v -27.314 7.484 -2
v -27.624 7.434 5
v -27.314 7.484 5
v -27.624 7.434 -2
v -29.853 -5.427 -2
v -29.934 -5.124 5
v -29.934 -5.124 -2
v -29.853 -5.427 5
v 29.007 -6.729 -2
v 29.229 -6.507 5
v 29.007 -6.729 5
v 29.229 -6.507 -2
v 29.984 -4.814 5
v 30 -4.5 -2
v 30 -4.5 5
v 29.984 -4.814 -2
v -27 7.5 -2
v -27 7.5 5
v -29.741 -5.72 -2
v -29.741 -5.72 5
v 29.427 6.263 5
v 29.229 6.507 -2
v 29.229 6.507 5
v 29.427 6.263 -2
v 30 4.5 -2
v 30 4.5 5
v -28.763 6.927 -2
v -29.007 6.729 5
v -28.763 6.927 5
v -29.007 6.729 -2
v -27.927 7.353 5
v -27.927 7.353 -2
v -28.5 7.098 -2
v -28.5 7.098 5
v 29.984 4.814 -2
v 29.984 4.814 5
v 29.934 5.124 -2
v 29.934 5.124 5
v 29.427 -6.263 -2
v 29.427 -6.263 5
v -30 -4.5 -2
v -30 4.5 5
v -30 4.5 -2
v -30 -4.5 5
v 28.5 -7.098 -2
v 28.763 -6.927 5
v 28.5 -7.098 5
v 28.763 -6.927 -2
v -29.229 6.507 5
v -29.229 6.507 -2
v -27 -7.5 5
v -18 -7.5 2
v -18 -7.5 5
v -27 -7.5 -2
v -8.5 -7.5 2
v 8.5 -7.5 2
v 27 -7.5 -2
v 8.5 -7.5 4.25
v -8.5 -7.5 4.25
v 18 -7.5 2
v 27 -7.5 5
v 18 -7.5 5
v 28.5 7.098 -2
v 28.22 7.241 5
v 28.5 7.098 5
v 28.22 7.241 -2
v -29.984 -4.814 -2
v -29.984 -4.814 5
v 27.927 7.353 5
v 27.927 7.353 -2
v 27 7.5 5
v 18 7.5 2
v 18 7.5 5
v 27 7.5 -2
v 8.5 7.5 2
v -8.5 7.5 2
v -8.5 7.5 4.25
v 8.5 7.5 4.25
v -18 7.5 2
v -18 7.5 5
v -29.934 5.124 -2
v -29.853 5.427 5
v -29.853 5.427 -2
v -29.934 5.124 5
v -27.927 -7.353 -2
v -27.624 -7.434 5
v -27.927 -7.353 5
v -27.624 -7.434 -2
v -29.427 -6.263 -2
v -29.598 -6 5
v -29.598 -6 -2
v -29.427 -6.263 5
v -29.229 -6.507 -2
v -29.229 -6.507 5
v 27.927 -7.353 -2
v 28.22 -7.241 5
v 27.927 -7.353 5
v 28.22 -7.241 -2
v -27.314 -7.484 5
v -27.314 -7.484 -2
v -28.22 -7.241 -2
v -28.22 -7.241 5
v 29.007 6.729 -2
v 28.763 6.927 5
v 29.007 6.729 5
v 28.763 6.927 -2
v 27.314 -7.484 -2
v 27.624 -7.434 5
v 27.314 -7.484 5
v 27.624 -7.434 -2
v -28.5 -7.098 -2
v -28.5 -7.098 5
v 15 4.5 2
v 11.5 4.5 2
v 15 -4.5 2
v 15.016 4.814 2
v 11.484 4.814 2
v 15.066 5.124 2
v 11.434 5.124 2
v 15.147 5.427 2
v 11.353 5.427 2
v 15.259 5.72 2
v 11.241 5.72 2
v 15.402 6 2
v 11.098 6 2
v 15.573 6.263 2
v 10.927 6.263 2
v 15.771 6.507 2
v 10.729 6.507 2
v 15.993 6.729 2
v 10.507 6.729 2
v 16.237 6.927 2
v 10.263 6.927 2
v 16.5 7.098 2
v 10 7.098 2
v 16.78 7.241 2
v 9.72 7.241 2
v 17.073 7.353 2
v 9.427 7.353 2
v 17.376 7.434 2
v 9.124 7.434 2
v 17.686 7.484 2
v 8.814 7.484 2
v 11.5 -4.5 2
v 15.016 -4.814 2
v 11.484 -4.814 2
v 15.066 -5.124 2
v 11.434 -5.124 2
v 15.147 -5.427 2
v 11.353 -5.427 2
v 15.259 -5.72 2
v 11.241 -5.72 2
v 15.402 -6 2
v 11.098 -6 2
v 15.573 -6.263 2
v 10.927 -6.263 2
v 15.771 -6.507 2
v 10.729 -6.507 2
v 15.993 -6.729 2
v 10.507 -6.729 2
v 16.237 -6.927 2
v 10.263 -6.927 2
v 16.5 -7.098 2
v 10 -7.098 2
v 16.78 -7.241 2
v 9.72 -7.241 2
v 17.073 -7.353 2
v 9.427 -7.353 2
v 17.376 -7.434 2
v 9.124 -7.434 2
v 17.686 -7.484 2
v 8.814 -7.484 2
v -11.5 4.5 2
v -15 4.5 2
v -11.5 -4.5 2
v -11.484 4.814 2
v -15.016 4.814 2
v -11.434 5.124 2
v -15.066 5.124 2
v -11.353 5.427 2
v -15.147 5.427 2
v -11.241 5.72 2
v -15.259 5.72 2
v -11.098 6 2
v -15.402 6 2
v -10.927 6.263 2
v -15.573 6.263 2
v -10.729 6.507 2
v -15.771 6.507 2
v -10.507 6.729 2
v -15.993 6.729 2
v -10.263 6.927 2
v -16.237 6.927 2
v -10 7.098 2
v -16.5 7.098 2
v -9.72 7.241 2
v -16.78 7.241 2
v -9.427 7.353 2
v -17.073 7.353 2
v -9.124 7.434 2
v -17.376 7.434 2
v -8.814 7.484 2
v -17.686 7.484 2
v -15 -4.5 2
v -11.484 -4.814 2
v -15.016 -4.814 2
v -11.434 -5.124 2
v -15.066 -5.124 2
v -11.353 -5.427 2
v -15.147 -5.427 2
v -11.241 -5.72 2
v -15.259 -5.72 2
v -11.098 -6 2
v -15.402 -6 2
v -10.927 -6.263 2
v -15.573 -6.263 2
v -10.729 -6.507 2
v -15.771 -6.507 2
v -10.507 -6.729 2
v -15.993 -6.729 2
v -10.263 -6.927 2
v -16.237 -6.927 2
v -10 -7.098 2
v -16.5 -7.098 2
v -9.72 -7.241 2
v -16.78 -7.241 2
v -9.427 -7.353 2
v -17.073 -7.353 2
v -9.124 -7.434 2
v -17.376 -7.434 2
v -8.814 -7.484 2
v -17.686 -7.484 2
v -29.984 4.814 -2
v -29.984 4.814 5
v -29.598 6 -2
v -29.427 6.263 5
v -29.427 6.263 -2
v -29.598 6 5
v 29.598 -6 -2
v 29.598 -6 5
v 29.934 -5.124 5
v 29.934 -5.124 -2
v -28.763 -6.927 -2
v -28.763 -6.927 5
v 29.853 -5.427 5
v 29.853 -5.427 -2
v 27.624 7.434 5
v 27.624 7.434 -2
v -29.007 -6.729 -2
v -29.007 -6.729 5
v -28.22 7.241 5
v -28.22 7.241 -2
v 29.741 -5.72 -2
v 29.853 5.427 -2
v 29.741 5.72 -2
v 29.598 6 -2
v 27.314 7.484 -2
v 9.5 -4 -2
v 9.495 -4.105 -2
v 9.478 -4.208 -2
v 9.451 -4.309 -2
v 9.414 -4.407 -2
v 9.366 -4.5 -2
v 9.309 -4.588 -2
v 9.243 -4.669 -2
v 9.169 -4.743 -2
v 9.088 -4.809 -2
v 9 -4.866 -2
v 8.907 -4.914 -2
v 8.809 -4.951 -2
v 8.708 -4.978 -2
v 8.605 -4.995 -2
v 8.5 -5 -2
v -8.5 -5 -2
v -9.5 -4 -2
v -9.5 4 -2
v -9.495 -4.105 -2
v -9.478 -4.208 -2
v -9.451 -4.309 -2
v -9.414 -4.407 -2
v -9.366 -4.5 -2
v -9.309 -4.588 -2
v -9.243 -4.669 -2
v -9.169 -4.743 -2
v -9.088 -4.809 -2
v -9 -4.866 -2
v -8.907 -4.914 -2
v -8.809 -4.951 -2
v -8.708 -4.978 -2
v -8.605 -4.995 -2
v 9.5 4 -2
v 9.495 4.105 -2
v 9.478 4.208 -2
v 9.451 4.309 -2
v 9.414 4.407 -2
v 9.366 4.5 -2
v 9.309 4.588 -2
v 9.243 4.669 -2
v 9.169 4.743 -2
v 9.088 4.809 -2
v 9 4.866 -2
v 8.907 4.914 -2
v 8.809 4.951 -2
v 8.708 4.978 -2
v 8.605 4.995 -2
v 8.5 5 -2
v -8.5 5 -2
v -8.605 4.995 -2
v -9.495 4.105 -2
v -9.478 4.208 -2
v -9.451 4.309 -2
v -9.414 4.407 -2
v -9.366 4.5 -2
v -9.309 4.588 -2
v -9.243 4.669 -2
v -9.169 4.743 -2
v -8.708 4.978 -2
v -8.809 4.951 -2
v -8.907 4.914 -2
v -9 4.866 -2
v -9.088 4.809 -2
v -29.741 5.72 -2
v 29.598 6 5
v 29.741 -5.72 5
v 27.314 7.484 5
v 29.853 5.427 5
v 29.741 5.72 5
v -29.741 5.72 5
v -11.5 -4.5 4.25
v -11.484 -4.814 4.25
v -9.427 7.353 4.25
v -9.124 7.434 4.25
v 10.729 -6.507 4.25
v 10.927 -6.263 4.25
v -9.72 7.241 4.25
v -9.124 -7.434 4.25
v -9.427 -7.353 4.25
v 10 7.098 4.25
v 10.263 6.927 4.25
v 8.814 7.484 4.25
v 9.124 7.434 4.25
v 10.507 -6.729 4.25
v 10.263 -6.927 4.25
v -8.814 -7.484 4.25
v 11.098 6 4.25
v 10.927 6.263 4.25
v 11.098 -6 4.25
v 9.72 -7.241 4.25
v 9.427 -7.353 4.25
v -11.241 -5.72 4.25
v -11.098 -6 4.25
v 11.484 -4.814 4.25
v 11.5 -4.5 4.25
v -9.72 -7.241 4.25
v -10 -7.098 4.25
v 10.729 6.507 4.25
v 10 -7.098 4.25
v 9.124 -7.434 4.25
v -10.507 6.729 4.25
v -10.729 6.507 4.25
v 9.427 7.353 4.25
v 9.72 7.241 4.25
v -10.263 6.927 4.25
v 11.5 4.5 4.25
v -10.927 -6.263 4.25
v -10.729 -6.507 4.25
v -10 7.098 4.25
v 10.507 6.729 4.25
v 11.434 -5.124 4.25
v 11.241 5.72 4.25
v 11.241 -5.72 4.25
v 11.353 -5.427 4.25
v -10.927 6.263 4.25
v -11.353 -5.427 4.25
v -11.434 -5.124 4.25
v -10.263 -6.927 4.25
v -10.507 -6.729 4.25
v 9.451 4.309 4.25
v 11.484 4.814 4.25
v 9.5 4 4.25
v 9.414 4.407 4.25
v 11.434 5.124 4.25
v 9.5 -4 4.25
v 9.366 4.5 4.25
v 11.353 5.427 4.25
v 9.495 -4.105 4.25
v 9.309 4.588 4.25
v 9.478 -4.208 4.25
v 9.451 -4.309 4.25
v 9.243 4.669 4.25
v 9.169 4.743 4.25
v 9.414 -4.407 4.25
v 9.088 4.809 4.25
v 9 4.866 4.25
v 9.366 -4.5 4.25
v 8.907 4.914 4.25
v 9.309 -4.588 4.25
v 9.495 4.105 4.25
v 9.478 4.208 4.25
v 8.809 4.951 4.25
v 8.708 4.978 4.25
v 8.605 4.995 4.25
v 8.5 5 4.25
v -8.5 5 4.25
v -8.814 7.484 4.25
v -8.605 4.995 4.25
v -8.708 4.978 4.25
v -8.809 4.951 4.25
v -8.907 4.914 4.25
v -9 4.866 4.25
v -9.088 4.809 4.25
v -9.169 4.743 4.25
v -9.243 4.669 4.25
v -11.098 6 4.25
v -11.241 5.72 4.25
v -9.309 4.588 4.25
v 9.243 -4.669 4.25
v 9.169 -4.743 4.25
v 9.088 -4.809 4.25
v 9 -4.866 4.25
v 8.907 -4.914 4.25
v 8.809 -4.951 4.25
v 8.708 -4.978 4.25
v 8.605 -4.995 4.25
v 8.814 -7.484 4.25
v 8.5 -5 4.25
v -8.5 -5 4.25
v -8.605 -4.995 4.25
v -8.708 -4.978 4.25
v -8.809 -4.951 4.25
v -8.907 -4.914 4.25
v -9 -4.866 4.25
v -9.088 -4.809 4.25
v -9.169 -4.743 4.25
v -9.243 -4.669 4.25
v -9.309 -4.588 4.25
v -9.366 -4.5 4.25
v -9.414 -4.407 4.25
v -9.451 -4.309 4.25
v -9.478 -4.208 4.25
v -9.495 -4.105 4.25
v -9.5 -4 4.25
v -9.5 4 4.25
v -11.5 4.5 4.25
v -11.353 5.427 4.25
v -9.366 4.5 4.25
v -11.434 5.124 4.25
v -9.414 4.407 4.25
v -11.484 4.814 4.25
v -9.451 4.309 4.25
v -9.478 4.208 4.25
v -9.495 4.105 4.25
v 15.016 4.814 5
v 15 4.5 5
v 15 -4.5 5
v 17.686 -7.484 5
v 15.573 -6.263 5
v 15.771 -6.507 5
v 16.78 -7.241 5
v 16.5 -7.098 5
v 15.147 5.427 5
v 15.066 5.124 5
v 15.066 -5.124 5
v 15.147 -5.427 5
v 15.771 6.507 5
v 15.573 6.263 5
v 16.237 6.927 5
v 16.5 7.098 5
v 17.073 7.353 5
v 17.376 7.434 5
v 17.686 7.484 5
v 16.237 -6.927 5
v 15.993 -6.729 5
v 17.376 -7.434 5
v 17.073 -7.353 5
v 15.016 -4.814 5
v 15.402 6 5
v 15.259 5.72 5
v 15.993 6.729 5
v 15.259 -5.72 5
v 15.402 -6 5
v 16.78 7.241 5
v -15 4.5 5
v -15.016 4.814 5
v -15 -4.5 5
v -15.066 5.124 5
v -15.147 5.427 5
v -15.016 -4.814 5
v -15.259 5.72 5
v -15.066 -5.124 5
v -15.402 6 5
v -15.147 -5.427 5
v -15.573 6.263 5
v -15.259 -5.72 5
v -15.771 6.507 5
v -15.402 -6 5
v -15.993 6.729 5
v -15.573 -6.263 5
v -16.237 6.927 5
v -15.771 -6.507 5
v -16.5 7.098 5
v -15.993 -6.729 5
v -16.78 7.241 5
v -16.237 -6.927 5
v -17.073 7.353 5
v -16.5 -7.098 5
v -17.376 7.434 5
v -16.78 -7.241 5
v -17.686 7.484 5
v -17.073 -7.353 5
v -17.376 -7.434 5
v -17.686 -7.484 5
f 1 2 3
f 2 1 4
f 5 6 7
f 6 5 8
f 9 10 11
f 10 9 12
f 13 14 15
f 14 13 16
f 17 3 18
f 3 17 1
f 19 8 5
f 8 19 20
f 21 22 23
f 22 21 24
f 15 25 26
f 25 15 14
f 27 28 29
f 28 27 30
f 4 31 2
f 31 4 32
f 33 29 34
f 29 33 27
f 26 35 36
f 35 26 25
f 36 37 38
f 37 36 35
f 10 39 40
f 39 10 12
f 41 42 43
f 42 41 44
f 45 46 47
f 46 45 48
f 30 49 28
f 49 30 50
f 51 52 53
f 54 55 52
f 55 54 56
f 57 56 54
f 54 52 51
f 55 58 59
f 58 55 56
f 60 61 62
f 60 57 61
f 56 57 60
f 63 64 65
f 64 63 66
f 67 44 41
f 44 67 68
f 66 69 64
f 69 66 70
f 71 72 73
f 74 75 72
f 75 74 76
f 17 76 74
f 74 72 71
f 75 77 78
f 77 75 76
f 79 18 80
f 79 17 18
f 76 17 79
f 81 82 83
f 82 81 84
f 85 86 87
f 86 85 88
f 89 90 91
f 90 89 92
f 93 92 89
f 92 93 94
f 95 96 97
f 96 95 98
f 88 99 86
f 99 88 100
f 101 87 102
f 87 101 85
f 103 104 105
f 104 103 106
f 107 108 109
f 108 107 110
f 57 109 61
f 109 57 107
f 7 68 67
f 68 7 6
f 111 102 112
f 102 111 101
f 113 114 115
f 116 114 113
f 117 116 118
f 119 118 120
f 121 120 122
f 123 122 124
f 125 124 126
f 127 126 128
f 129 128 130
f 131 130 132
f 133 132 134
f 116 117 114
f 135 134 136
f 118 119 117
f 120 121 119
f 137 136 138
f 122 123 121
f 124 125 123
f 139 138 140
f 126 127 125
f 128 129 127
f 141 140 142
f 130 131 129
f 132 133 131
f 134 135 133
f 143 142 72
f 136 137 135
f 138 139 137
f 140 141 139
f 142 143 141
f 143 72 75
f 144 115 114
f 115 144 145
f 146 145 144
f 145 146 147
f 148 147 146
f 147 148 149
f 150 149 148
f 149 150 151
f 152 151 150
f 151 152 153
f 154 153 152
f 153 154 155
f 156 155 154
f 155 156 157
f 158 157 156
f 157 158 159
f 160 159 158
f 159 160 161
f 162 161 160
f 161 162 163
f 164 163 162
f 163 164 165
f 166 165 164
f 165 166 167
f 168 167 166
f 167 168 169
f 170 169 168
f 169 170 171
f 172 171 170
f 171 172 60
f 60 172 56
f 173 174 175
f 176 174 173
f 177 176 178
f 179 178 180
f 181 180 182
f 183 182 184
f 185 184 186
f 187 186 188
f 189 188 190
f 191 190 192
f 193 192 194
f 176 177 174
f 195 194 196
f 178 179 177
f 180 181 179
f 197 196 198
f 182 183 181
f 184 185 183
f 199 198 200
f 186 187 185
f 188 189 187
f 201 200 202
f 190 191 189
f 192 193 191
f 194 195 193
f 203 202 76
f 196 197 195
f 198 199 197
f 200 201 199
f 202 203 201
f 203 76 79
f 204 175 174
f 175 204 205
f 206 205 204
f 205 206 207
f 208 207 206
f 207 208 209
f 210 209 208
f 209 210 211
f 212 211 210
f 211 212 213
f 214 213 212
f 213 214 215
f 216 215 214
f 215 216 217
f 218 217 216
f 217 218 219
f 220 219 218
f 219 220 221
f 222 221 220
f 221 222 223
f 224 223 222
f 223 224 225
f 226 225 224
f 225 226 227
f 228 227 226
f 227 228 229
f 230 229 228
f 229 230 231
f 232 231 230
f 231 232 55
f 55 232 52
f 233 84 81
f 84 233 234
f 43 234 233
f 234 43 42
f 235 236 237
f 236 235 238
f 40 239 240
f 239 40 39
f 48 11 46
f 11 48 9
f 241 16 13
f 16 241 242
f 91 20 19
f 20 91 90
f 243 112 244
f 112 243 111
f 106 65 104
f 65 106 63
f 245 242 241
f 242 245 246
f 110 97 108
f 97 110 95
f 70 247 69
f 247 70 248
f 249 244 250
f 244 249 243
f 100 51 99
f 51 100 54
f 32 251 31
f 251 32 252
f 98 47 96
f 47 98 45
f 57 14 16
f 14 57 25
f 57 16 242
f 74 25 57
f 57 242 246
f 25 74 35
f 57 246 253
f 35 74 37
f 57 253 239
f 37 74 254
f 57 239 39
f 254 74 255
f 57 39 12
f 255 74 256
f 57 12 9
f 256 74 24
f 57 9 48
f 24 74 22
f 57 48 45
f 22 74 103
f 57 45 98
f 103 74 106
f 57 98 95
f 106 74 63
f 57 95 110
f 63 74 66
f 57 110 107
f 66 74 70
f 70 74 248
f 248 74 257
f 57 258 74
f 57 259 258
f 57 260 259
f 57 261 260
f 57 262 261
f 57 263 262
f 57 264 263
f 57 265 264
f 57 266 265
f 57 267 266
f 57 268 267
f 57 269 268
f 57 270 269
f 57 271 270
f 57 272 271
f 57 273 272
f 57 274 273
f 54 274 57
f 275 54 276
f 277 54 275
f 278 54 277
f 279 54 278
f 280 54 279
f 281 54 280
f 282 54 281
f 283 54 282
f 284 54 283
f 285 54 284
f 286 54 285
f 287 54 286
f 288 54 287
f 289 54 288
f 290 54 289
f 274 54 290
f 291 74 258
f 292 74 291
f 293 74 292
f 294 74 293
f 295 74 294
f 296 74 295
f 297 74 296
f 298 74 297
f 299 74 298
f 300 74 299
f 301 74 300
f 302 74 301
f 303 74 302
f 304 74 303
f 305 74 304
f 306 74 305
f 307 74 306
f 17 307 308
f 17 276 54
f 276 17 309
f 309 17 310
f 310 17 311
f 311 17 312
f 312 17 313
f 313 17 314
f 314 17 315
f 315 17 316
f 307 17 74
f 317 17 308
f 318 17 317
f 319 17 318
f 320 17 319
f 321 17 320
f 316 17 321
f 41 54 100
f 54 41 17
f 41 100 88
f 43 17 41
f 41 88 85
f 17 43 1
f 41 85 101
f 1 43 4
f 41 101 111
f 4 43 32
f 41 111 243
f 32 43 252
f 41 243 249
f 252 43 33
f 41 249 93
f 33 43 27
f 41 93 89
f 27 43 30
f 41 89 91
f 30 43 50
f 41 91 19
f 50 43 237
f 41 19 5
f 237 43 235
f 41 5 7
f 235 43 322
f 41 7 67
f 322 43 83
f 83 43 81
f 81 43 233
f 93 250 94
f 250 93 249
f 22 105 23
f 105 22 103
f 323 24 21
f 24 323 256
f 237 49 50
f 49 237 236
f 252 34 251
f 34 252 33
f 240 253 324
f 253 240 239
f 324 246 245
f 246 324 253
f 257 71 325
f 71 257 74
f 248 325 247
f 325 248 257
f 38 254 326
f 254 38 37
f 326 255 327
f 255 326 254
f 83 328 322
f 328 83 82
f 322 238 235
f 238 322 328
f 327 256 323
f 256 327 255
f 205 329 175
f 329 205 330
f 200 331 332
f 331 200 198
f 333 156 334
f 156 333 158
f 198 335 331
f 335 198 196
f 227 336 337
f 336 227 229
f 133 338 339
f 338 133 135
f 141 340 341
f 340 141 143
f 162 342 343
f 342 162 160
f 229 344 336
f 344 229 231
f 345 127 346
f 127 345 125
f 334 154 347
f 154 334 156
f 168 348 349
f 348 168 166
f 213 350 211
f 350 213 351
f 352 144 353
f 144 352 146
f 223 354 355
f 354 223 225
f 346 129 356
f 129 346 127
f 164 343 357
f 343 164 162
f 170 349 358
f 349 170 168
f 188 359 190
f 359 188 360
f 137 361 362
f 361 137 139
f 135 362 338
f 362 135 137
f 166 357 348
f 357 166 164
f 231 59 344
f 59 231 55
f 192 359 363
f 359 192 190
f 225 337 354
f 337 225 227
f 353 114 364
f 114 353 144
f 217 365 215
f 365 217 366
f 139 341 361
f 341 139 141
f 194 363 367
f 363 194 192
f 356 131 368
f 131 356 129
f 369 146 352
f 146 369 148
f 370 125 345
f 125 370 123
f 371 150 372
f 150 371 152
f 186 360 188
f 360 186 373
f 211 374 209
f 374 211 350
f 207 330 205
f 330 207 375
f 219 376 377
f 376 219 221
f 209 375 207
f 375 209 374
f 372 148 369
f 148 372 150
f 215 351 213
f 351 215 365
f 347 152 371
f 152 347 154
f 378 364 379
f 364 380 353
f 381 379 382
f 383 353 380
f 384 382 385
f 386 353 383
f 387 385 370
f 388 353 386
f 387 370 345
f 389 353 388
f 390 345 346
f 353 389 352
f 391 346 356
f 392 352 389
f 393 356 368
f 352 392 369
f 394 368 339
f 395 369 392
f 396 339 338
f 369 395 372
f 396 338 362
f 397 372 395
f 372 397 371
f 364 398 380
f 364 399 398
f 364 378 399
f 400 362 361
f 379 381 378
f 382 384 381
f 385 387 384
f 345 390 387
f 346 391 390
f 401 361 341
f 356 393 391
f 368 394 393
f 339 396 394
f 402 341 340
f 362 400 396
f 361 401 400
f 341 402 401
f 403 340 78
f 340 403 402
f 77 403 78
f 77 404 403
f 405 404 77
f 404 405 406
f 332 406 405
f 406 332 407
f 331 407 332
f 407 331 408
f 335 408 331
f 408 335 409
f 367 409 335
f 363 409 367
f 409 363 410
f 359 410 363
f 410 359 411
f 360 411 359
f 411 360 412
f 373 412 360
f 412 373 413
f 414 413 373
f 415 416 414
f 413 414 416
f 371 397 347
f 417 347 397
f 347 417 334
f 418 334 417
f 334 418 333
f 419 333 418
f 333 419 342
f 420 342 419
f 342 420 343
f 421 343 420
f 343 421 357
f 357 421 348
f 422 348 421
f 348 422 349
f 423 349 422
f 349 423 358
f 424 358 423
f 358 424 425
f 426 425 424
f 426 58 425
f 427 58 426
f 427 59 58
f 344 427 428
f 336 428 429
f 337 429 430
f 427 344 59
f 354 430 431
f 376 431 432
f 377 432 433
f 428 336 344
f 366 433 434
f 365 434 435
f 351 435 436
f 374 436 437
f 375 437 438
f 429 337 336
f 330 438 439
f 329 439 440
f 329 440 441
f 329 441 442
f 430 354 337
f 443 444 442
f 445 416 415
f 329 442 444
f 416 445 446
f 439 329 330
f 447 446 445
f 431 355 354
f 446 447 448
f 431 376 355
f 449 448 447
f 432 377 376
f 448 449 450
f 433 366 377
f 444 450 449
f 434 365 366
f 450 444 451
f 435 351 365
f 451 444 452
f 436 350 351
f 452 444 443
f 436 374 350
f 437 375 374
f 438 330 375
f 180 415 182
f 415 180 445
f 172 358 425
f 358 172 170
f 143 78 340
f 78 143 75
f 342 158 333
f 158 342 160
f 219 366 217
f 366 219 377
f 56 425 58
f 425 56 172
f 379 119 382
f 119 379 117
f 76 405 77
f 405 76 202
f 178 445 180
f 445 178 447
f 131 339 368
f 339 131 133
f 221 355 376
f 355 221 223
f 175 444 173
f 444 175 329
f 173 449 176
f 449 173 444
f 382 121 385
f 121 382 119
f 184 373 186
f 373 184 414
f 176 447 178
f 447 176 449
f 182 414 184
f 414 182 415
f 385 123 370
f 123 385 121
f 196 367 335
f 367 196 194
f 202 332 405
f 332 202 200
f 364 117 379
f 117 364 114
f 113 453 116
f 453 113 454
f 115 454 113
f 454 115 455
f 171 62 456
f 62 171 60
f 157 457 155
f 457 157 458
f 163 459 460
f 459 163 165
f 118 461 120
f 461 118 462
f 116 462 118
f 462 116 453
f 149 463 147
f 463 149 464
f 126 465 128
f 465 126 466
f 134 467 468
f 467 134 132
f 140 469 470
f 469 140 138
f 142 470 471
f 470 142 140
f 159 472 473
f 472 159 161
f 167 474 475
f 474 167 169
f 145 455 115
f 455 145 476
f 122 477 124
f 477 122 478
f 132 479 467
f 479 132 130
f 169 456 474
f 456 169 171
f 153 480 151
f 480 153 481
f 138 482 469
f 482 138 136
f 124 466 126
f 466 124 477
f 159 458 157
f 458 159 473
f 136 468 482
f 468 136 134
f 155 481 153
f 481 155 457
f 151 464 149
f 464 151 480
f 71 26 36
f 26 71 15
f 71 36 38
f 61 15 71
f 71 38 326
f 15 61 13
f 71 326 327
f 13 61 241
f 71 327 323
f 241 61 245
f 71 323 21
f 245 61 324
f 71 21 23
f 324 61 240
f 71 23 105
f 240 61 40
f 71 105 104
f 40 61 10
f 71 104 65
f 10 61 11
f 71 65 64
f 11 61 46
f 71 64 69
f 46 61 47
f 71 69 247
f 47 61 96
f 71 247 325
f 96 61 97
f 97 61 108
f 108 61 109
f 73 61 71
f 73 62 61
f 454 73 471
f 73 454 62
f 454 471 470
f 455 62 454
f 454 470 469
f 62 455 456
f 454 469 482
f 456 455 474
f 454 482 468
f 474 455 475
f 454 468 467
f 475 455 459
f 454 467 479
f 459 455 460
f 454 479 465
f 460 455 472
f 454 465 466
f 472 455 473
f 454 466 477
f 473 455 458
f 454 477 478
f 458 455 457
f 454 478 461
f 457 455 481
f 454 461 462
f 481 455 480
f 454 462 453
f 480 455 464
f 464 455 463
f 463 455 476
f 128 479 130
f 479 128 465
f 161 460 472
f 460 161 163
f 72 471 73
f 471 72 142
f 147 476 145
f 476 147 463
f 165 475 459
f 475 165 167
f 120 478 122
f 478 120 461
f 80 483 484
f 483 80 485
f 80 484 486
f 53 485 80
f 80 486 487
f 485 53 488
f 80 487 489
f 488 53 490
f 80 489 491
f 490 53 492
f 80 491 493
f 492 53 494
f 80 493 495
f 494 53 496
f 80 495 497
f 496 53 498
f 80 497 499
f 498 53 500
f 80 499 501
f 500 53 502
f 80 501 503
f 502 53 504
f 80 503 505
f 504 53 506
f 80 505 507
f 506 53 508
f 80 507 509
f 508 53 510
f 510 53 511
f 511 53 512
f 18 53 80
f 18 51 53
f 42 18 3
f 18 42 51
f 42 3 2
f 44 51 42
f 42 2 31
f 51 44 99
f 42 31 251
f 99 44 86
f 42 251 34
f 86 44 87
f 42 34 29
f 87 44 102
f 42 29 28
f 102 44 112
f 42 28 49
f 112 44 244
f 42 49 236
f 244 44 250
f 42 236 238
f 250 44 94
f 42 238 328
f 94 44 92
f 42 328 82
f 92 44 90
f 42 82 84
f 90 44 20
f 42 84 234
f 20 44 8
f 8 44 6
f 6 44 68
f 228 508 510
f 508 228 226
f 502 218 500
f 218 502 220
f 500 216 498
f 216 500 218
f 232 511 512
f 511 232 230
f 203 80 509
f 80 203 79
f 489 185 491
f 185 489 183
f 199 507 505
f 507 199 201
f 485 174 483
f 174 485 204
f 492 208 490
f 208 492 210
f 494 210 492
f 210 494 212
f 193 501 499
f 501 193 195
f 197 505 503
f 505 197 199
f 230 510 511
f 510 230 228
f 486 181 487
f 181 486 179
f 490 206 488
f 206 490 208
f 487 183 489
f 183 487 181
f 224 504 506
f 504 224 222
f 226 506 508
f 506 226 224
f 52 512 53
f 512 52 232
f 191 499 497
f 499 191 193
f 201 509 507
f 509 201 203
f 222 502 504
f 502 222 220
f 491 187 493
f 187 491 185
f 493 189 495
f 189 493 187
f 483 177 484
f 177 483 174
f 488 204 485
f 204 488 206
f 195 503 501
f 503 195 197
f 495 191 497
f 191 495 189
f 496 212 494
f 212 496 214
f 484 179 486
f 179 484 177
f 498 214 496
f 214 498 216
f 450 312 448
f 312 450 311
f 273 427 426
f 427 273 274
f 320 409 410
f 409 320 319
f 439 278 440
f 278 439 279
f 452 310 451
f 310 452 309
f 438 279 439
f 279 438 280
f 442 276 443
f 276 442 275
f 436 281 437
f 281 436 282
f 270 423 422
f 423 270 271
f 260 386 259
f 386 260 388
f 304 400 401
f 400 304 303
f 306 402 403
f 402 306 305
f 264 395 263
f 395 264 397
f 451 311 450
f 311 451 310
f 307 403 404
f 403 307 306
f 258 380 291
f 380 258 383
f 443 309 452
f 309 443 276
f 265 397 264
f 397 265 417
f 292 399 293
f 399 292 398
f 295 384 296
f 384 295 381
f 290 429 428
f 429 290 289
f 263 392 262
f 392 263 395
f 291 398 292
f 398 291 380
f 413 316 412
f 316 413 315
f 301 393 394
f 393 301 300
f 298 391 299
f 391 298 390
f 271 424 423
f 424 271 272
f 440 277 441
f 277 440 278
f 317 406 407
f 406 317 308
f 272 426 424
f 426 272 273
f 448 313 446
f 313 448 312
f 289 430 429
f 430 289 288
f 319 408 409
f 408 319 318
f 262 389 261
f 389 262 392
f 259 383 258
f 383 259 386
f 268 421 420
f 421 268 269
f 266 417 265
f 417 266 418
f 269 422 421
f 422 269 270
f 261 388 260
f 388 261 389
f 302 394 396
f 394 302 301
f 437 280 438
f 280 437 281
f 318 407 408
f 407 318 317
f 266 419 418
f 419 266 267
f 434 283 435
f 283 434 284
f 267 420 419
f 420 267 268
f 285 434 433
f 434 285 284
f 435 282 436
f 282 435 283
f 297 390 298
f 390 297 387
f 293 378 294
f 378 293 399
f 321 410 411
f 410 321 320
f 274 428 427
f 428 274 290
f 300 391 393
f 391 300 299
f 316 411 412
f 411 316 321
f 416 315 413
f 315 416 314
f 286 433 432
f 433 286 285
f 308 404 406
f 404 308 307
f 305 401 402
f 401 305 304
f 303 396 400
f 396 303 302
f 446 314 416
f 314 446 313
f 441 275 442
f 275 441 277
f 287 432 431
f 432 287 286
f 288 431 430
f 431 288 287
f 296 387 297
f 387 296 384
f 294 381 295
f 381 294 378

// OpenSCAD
// file: ../../scadLib/library.scad
////////////////////////////////////////////////////////////////////////////////////////////////////
module plate4Point(x,y,z,d){
	hull(){
		color("green") translate([(x/2)-(d/2) ,(y/2) -(d/2),0]) cylinder(h=z, d=d, center=true);
		color("blue")  translate([(x/2)-(d/2) ,-(y/2)+(d/2),0]) cylinder(h=z, d=d, center=true);
		color("red")   translate([-(x/2)+(d/2),(y/2) -(d/2),0]) cylinder(h=z, d=d, center=true);
		color("grey")  translate([-(x/2)+(d/2),-(y/2)+(d/2),0]) cylinder(h=z, d=d, center=true);
	}
}
////////////////////////////////////////////////////////////////////////////////////////////////////
module plate2Point(x,z,d){
	hull(){
		color("green") translate([(x/2) -(d/2),0 ,0]) cylinder(h=z, d=d, center=true);
		color("blue")  translate([-(x/2)+(d/2),0 ,0]) cylinder(h=z, d=d, center=true);
	}
}
////////////////////////////////////////////////////////////////////////////////////////////////////
module triagleSphere(iX, iY, iZ, iD){
	
	halfD = iD/2;
	hull(){
		color("red")		translate([-halfD   , (iY/2)-halfD, halfD]) sphere(d=iD);	
		color("grey")		translate([-iX+halfD, (iY/2)-halfD, halfD]) sphere(d=iD);
		color("green")	translate([-halfD   , (iY/2)-halfD, iZ-halfD]) sphere(d=iD);

		color("red")		translate([-halfD   , -(iY/2)+halfD, halfD]) sphere(d=iD);
		color("grey")		translate([-iX+halfD, -(iY/2)+halfD, halfD]) sphere(d=iD);
		color("green")	translate([-halfD   , -(iY/2)+halfD, iZ-halfD]) sphere(d=iD);
	}
}
////////////////////////////////////////////////////////////////////////////////////////////////////
module cubeSphere(iX, iYm, iZ, iD){

	edgeDiamitor = iD;
	
	hull(){
		for(a=[[1,1,1],[-1,1,1],[1,-1,1],[-1,-1,1],[1,1,-1],[-1,1,-1],[1,-1,-1],[-1,-1,-1]]){
			translate([
				a[0]*((iX/2) -(edgeDiamitor/2)), 
				a[1]*((iYm/2)-(edgeDiamitor/2)), 
				a[2]*((iZ/2) -(edgeDiamitor/2))]) sphere(d=edgeDiamitor);
		}
	}
} 
////////////////////////////////////////////////////////////////////////////////////////////////////
module mText(l, letter_size = 10, letter_height = 4) {
// Use linear_extrude() to make the letters 3D objects as they
// are only 2D shapes when only using text()
	font = "Bitstream Vera Sans:style=Bold" ;
	linear_extrude(height = letter_height) {
		text(l, size = letter_size, font = font, halign = "center", valign = "center", $fn = 16);
	}
}
module roundedTrapezoid(x1=1, y1=1,x2=1, y2=1, z1=1, d1=6){
  hull(){
  // top Right
    translate([-x1,y1,0])
      cylinder(h=z1,d=d1,center=true);
  // Top Left
    translate([-x1,-y1,0])
      cylinder(h=z1,d=d1,center=true);
  // Bottom Right
    translate([-x2,y2,0])
      cylinder(h=z1,d=d1,center=true);
  // Bottom Left
    translate([-x2,-y2,0])
      cylinder(h=z1,d=d1,center=true);
  }
}
// main file
use<../../scadLib/library.scad>;

$fn=60;

db9Width  = 18.9 + .1;
db9Depth  = 10;
db9Heigth = 9.4 + .6;

spaceBetweenConnectors = 6;

difference(){
	union(){
		plate4Point(60,15,4,6);
		
		translate([0,0,1.25])
			plate4Point(23,15,spaceBetweenConnectors,6);
		
		translate([22.5,0,3])
			plate4Point(15,15,4,6);
		translate([-22.5,0,3])
			plate4Point(15,15,4,6);
	}
//	for(a=[[-30],[0],[30]]){
//		translate([a[0],0,0])
			cutout();
//	}
}
module cutout(){
	plate4Point(db9Width,db9Heigth,db9Depth,2);

}
